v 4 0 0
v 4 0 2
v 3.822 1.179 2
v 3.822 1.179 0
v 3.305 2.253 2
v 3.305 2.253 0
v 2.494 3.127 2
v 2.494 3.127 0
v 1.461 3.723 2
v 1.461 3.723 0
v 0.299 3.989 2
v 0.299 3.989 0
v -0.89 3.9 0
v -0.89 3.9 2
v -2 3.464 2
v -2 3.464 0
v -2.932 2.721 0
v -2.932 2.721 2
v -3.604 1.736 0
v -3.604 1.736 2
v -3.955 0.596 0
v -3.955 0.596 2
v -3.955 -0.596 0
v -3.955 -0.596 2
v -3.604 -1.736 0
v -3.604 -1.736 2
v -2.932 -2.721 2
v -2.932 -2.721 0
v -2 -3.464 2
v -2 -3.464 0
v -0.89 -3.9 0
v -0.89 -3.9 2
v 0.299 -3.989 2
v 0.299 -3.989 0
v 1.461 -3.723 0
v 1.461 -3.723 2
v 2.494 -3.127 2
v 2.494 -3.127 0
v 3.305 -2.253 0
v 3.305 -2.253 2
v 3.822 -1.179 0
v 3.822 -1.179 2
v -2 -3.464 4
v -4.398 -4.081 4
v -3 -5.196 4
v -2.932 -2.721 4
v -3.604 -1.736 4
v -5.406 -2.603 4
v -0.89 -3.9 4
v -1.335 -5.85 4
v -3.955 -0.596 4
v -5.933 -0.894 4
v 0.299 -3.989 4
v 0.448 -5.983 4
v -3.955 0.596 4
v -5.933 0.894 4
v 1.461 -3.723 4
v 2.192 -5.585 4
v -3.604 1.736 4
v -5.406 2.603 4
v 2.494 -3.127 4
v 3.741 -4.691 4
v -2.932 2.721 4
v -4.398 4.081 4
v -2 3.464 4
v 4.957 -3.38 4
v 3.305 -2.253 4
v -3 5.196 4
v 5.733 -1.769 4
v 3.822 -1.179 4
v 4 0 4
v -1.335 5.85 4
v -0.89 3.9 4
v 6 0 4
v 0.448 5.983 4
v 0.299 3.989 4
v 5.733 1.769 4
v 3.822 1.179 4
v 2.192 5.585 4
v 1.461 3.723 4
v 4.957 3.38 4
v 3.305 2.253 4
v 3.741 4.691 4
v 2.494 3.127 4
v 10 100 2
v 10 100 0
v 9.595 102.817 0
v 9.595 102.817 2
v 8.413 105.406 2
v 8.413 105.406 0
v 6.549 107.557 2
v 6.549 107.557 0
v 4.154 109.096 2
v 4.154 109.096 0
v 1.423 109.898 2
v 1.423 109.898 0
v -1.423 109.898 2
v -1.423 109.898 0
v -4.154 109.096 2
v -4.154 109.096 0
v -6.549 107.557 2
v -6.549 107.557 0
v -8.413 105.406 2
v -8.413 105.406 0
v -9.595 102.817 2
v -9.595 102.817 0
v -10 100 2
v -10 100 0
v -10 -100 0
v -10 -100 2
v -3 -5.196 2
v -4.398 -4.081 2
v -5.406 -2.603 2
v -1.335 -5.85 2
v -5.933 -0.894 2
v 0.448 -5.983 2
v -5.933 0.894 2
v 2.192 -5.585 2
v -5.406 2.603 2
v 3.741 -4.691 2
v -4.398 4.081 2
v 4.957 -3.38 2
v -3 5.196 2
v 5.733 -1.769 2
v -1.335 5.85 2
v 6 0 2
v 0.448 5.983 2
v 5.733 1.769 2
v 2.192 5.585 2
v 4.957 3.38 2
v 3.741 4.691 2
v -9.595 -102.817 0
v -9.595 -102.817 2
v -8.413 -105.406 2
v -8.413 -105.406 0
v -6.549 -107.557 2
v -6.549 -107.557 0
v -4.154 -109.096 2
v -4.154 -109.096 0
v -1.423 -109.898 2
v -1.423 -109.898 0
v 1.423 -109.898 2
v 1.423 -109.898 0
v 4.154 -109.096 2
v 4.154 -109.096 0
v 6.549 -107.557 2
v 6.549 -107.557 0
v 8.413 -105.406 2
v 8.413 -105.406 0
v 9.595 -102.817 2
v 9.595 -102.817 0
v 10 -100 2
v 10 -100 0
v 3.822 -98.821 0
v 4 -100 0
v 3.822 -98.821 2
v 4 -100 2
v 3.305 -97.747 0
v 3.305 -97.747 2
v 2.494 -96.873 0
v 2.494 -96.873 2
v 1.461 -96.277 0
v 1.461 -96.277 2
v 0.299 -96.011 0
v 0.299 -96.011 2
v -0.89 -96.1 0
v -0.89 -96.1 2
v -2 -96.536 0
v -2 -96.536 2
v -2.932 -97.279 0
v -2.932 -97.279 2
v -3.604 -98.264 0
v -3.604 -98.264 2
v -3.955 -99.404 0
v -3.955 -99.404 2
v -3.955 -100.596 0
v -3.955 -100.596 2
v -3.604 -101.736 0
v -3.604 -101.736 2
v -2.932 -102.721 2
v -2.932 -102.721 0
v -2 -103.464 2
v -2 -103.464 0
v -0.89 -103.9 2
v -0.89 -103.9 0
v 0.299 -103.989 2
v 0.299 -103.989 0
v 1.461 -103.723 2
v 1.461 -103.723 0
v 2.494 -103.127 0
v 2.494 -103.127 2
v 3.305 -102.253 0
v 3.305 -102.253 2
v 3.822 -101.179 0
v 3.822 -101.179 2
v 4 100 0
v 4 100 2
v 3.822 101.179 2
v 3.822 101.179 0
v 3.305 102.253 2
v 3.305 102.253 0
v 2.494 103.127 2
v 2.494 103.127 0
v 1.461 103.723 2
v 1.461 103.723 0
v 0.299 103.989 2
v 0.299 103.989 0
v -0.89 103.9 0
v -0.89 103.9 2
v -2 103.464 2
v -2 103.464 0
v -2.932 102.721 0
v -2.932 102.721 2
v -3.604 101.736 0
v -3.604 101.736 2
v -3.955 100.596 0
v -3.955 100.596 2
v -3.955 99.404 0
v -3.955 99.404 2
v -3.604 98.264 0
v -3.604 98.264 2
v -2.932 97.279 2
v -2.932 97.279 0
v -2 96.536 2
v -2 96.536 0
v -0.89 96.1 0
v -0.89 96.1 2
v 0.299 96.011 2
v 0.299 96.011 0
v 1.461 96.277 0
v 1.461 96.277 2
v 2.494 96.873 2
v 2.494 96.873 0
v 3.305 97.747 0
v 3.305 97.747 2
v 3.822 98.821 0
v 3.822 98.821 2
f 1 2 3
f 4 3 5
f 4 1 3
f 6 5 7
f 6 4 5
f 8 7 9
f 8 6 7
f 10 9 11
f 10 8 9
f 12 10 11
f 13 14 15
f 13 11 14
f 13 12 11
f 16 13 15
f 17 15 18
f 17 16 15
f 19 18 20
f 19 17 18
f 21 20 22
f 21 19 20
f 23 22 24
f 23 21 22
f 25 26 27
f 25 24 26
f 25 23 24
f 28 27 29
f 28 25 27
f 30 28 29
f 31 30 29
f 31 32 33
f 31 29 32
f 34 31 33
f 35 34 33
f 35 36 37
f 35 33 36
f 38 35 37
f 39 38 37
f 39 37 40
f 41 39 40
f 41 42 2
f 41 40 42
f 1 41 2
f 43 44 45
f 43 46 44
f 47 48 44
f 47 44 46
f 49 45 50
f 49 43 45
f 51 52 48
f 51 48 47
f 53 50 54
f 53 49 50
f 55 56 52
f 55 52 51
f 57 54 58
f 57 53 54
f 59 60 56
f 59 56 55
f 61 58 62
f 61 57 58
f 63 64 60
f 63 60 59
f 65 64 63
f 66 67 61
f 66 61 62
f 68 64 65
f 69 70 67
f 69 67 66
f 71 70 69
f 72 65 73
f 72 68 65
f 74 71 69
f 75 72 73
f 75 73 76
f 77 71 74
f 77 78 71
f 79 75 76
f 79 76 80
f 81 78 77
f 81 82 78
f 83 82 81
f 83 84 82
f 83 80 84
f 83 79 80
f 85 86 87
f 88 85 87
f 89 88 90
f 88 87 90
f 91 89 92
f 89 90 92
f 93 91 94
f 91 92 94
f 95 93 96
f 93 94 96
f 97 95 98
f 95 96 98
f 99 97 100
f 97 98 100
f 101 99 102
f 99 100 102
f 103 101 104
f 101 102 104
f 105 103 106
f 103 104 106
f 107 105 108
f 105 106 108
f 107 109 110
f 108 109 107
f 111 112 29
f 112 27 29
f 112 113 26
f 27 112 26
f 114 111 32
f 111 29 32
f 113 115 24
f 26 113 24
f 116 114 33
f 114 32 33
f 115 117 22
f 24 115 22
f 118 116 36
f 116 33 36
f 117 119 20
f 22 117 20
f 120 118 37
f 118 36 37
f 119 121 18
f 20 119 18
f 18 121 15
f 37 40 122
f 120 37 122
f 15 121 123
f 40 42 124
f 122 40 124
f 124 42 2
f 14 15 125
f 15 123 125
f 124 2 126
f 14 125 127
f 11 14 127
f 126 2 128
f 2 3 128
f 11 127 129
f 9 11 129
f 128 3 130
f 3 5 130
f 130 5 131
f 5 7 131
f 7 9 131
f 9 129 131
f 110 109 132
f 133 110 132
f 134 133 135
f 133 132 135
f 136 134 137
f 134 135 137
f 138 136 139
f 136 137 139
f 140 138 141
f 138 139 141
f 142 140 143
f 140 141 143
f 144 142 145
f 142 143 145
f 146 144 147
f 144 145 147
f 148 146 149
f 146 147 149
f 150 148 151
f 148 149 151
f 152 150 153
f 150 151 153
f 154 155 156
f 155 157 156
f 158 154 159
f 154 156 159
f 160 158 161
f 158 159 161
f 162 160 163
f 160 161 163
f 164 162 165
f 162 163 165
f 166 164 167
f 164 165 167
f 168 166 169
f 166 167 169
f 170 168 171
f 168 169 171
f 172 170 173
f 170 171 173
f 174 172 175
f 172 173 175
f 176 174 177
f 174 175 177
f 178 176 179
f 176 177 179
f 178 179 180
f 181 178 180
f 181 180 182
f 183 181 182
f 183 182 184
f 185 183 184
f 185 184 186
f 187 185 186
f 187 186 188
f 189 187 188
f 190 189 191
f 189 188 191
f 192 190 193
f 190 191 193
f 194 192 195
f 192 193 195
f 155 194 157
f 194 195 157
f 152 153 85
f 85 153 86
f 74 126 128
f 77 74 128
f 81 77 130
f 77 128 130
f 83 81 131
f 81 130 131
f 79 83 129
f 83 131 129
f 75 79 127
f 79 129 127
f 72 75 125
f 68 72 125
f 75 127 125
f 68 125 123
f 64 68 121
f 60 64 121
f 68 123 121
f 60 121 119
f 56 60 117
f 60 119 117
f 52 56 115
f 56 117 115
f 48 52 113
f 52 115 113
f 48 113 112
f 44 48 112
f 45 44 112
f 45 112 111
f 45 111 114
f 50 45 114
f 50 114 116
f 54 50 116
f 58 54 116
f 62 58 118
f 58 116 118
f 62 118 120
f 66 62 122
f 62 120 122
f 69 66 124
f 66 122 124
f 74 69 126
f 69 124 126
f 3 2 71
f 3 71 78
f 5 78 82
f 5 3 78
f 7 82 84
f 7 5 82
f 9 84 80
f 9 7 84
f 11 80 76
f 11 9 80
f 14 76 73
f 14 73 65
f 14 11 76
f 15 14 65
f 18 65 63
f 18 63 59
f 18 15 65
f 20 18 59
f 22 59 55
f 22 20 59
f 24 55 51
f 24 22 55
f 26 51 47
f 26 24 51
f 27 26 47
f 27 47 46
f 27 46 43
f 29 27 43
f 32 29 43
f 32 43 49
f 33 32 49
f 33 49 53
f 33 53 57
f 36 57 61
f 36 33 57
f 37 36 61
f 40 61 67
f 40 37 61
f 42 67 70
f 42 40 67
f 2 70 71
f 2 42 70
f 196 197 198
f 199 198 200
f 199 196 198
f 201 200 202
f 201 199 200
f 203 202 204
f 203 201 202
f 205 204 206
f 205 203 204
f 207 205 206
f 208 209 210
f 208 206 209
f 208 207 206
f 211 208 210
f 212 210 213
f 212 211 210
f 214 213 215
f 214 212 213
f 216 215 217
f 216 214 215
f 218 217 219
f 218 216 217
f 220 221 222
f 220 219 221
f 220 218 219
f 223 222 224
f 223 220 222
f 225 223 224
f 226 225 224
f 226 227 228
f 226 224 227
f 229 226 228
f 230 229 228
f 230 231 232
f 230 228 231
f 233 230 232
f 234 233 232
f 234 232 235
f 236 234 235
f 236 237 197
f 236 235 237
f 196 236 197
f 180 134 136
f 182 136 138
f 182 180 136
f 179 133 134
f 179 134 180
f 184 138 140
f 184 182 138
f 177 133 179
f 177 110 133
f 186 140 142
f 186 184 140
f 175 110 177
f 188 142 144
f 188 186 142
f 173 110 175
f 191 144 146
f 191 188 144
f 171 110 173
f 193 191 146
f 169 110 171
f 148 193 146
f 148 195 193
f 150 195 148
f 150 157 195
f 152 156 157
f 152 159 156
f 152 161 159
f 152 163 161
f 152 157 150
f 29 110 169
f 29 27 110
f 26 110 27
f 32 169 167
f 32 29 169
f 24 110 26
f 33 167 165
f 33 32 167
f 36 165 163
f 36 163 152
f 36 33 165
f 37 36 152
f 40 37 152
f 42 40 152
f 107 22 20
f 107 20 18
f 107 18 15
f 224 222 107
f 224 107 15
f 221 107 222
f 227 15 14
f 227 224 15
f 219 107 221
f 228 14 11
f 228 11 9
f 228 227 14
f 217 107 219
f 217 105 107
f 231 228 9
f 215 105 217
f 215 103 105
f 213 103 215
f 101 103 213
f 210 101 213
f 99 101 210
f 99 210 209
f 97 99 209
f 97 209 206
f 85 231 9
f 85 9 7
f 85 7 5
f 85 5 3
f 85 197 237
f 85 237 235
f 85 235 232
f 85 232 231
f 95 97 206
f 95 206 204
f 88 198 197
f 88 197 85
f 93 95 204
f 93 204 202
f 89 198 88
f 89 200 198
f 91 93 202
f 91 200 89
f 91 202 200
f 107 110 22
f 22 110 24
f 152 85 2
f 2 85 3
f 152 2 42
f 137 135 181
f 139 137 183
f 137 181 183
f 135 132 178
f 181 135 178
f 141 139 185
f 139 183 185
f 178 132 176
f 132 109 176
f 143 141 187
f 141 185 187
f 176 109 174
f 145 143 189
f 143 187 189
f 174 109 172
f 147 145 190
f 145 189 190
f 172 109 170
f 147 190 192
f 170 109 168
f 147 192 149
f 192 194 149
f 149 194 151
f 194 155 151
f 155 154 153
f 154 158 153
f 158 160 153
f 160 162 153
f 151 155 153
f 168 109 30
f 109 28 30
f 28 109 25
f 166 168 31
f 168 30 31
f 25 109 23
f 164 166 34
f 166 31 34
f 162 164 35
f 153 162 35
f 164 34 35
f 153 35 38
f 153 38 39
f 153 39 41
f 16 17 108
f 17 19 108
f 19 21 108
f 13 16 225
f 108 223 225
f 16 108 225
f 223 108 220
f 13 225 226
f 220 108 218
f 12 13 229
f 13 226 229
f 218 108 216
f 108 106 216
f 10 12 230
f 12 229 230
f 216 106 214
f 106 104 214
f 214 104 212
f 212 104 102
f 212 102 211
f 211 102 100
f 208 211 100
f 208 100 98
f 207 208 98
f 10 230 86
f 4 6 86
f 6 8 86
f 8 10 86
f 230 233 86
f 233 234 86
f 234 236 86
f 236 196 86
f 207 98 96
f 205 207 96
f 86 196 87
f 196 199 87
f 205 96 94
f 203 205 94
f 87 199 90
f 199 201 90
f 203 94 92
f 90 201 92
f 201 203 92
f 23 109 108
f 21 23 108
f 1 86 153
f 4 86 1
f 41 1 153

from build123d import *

# Parameters (mm, degrees)
F0_W     = 20
F0_H     = 200
F1_DEPTH = 2
F2_R     = 4
F3_DEPTH = 12.5
F4_R     = 6
F4_R_2   = 4
F5_DEPTH = 2


with BuildPart() as f1:
    # F0 (on Top) → F1 (new body)
    with BuildSketch(Plane.XY):
        Rectangle(F0_W, F0_H)
        with BuildLine():
            Line((-10, 100), (10, 100))
            ThreePointArc((10, 100), (0, 110), (-10, 100))
        make_face()
        with BuildLine():
            ThreePointArc((-10, -100), (0, -110), (10, -100))
            Line((10, -100), (-10, -100))
        make_face()
    extrude(amount=F1_DEPTH)

    # F2 (on Top) → F3 (cut, symmetric)
    with BuildSketch(Plane.XY):
        with Locations((0, 100)):
            Circle(F2_R)
        Circle(F2_R)
        with Locations((0, -100)):
            Circle(F2_R)
    extrude(amount=F3_DEPTH, both=True, mode=Mode.SUBTRACT)


with BuildPart() as f5:
    # F4 (on face) → F5 (new body)
    with BuildSketch(Plane.XY.offset(2)):
        Circle(F4_R)
        Circle(F4_R_2, mode=Mode.SUBTRACT)
    extrude(amount=F5_DEPTH)


solid = Compound([f1.part, f5.part])
